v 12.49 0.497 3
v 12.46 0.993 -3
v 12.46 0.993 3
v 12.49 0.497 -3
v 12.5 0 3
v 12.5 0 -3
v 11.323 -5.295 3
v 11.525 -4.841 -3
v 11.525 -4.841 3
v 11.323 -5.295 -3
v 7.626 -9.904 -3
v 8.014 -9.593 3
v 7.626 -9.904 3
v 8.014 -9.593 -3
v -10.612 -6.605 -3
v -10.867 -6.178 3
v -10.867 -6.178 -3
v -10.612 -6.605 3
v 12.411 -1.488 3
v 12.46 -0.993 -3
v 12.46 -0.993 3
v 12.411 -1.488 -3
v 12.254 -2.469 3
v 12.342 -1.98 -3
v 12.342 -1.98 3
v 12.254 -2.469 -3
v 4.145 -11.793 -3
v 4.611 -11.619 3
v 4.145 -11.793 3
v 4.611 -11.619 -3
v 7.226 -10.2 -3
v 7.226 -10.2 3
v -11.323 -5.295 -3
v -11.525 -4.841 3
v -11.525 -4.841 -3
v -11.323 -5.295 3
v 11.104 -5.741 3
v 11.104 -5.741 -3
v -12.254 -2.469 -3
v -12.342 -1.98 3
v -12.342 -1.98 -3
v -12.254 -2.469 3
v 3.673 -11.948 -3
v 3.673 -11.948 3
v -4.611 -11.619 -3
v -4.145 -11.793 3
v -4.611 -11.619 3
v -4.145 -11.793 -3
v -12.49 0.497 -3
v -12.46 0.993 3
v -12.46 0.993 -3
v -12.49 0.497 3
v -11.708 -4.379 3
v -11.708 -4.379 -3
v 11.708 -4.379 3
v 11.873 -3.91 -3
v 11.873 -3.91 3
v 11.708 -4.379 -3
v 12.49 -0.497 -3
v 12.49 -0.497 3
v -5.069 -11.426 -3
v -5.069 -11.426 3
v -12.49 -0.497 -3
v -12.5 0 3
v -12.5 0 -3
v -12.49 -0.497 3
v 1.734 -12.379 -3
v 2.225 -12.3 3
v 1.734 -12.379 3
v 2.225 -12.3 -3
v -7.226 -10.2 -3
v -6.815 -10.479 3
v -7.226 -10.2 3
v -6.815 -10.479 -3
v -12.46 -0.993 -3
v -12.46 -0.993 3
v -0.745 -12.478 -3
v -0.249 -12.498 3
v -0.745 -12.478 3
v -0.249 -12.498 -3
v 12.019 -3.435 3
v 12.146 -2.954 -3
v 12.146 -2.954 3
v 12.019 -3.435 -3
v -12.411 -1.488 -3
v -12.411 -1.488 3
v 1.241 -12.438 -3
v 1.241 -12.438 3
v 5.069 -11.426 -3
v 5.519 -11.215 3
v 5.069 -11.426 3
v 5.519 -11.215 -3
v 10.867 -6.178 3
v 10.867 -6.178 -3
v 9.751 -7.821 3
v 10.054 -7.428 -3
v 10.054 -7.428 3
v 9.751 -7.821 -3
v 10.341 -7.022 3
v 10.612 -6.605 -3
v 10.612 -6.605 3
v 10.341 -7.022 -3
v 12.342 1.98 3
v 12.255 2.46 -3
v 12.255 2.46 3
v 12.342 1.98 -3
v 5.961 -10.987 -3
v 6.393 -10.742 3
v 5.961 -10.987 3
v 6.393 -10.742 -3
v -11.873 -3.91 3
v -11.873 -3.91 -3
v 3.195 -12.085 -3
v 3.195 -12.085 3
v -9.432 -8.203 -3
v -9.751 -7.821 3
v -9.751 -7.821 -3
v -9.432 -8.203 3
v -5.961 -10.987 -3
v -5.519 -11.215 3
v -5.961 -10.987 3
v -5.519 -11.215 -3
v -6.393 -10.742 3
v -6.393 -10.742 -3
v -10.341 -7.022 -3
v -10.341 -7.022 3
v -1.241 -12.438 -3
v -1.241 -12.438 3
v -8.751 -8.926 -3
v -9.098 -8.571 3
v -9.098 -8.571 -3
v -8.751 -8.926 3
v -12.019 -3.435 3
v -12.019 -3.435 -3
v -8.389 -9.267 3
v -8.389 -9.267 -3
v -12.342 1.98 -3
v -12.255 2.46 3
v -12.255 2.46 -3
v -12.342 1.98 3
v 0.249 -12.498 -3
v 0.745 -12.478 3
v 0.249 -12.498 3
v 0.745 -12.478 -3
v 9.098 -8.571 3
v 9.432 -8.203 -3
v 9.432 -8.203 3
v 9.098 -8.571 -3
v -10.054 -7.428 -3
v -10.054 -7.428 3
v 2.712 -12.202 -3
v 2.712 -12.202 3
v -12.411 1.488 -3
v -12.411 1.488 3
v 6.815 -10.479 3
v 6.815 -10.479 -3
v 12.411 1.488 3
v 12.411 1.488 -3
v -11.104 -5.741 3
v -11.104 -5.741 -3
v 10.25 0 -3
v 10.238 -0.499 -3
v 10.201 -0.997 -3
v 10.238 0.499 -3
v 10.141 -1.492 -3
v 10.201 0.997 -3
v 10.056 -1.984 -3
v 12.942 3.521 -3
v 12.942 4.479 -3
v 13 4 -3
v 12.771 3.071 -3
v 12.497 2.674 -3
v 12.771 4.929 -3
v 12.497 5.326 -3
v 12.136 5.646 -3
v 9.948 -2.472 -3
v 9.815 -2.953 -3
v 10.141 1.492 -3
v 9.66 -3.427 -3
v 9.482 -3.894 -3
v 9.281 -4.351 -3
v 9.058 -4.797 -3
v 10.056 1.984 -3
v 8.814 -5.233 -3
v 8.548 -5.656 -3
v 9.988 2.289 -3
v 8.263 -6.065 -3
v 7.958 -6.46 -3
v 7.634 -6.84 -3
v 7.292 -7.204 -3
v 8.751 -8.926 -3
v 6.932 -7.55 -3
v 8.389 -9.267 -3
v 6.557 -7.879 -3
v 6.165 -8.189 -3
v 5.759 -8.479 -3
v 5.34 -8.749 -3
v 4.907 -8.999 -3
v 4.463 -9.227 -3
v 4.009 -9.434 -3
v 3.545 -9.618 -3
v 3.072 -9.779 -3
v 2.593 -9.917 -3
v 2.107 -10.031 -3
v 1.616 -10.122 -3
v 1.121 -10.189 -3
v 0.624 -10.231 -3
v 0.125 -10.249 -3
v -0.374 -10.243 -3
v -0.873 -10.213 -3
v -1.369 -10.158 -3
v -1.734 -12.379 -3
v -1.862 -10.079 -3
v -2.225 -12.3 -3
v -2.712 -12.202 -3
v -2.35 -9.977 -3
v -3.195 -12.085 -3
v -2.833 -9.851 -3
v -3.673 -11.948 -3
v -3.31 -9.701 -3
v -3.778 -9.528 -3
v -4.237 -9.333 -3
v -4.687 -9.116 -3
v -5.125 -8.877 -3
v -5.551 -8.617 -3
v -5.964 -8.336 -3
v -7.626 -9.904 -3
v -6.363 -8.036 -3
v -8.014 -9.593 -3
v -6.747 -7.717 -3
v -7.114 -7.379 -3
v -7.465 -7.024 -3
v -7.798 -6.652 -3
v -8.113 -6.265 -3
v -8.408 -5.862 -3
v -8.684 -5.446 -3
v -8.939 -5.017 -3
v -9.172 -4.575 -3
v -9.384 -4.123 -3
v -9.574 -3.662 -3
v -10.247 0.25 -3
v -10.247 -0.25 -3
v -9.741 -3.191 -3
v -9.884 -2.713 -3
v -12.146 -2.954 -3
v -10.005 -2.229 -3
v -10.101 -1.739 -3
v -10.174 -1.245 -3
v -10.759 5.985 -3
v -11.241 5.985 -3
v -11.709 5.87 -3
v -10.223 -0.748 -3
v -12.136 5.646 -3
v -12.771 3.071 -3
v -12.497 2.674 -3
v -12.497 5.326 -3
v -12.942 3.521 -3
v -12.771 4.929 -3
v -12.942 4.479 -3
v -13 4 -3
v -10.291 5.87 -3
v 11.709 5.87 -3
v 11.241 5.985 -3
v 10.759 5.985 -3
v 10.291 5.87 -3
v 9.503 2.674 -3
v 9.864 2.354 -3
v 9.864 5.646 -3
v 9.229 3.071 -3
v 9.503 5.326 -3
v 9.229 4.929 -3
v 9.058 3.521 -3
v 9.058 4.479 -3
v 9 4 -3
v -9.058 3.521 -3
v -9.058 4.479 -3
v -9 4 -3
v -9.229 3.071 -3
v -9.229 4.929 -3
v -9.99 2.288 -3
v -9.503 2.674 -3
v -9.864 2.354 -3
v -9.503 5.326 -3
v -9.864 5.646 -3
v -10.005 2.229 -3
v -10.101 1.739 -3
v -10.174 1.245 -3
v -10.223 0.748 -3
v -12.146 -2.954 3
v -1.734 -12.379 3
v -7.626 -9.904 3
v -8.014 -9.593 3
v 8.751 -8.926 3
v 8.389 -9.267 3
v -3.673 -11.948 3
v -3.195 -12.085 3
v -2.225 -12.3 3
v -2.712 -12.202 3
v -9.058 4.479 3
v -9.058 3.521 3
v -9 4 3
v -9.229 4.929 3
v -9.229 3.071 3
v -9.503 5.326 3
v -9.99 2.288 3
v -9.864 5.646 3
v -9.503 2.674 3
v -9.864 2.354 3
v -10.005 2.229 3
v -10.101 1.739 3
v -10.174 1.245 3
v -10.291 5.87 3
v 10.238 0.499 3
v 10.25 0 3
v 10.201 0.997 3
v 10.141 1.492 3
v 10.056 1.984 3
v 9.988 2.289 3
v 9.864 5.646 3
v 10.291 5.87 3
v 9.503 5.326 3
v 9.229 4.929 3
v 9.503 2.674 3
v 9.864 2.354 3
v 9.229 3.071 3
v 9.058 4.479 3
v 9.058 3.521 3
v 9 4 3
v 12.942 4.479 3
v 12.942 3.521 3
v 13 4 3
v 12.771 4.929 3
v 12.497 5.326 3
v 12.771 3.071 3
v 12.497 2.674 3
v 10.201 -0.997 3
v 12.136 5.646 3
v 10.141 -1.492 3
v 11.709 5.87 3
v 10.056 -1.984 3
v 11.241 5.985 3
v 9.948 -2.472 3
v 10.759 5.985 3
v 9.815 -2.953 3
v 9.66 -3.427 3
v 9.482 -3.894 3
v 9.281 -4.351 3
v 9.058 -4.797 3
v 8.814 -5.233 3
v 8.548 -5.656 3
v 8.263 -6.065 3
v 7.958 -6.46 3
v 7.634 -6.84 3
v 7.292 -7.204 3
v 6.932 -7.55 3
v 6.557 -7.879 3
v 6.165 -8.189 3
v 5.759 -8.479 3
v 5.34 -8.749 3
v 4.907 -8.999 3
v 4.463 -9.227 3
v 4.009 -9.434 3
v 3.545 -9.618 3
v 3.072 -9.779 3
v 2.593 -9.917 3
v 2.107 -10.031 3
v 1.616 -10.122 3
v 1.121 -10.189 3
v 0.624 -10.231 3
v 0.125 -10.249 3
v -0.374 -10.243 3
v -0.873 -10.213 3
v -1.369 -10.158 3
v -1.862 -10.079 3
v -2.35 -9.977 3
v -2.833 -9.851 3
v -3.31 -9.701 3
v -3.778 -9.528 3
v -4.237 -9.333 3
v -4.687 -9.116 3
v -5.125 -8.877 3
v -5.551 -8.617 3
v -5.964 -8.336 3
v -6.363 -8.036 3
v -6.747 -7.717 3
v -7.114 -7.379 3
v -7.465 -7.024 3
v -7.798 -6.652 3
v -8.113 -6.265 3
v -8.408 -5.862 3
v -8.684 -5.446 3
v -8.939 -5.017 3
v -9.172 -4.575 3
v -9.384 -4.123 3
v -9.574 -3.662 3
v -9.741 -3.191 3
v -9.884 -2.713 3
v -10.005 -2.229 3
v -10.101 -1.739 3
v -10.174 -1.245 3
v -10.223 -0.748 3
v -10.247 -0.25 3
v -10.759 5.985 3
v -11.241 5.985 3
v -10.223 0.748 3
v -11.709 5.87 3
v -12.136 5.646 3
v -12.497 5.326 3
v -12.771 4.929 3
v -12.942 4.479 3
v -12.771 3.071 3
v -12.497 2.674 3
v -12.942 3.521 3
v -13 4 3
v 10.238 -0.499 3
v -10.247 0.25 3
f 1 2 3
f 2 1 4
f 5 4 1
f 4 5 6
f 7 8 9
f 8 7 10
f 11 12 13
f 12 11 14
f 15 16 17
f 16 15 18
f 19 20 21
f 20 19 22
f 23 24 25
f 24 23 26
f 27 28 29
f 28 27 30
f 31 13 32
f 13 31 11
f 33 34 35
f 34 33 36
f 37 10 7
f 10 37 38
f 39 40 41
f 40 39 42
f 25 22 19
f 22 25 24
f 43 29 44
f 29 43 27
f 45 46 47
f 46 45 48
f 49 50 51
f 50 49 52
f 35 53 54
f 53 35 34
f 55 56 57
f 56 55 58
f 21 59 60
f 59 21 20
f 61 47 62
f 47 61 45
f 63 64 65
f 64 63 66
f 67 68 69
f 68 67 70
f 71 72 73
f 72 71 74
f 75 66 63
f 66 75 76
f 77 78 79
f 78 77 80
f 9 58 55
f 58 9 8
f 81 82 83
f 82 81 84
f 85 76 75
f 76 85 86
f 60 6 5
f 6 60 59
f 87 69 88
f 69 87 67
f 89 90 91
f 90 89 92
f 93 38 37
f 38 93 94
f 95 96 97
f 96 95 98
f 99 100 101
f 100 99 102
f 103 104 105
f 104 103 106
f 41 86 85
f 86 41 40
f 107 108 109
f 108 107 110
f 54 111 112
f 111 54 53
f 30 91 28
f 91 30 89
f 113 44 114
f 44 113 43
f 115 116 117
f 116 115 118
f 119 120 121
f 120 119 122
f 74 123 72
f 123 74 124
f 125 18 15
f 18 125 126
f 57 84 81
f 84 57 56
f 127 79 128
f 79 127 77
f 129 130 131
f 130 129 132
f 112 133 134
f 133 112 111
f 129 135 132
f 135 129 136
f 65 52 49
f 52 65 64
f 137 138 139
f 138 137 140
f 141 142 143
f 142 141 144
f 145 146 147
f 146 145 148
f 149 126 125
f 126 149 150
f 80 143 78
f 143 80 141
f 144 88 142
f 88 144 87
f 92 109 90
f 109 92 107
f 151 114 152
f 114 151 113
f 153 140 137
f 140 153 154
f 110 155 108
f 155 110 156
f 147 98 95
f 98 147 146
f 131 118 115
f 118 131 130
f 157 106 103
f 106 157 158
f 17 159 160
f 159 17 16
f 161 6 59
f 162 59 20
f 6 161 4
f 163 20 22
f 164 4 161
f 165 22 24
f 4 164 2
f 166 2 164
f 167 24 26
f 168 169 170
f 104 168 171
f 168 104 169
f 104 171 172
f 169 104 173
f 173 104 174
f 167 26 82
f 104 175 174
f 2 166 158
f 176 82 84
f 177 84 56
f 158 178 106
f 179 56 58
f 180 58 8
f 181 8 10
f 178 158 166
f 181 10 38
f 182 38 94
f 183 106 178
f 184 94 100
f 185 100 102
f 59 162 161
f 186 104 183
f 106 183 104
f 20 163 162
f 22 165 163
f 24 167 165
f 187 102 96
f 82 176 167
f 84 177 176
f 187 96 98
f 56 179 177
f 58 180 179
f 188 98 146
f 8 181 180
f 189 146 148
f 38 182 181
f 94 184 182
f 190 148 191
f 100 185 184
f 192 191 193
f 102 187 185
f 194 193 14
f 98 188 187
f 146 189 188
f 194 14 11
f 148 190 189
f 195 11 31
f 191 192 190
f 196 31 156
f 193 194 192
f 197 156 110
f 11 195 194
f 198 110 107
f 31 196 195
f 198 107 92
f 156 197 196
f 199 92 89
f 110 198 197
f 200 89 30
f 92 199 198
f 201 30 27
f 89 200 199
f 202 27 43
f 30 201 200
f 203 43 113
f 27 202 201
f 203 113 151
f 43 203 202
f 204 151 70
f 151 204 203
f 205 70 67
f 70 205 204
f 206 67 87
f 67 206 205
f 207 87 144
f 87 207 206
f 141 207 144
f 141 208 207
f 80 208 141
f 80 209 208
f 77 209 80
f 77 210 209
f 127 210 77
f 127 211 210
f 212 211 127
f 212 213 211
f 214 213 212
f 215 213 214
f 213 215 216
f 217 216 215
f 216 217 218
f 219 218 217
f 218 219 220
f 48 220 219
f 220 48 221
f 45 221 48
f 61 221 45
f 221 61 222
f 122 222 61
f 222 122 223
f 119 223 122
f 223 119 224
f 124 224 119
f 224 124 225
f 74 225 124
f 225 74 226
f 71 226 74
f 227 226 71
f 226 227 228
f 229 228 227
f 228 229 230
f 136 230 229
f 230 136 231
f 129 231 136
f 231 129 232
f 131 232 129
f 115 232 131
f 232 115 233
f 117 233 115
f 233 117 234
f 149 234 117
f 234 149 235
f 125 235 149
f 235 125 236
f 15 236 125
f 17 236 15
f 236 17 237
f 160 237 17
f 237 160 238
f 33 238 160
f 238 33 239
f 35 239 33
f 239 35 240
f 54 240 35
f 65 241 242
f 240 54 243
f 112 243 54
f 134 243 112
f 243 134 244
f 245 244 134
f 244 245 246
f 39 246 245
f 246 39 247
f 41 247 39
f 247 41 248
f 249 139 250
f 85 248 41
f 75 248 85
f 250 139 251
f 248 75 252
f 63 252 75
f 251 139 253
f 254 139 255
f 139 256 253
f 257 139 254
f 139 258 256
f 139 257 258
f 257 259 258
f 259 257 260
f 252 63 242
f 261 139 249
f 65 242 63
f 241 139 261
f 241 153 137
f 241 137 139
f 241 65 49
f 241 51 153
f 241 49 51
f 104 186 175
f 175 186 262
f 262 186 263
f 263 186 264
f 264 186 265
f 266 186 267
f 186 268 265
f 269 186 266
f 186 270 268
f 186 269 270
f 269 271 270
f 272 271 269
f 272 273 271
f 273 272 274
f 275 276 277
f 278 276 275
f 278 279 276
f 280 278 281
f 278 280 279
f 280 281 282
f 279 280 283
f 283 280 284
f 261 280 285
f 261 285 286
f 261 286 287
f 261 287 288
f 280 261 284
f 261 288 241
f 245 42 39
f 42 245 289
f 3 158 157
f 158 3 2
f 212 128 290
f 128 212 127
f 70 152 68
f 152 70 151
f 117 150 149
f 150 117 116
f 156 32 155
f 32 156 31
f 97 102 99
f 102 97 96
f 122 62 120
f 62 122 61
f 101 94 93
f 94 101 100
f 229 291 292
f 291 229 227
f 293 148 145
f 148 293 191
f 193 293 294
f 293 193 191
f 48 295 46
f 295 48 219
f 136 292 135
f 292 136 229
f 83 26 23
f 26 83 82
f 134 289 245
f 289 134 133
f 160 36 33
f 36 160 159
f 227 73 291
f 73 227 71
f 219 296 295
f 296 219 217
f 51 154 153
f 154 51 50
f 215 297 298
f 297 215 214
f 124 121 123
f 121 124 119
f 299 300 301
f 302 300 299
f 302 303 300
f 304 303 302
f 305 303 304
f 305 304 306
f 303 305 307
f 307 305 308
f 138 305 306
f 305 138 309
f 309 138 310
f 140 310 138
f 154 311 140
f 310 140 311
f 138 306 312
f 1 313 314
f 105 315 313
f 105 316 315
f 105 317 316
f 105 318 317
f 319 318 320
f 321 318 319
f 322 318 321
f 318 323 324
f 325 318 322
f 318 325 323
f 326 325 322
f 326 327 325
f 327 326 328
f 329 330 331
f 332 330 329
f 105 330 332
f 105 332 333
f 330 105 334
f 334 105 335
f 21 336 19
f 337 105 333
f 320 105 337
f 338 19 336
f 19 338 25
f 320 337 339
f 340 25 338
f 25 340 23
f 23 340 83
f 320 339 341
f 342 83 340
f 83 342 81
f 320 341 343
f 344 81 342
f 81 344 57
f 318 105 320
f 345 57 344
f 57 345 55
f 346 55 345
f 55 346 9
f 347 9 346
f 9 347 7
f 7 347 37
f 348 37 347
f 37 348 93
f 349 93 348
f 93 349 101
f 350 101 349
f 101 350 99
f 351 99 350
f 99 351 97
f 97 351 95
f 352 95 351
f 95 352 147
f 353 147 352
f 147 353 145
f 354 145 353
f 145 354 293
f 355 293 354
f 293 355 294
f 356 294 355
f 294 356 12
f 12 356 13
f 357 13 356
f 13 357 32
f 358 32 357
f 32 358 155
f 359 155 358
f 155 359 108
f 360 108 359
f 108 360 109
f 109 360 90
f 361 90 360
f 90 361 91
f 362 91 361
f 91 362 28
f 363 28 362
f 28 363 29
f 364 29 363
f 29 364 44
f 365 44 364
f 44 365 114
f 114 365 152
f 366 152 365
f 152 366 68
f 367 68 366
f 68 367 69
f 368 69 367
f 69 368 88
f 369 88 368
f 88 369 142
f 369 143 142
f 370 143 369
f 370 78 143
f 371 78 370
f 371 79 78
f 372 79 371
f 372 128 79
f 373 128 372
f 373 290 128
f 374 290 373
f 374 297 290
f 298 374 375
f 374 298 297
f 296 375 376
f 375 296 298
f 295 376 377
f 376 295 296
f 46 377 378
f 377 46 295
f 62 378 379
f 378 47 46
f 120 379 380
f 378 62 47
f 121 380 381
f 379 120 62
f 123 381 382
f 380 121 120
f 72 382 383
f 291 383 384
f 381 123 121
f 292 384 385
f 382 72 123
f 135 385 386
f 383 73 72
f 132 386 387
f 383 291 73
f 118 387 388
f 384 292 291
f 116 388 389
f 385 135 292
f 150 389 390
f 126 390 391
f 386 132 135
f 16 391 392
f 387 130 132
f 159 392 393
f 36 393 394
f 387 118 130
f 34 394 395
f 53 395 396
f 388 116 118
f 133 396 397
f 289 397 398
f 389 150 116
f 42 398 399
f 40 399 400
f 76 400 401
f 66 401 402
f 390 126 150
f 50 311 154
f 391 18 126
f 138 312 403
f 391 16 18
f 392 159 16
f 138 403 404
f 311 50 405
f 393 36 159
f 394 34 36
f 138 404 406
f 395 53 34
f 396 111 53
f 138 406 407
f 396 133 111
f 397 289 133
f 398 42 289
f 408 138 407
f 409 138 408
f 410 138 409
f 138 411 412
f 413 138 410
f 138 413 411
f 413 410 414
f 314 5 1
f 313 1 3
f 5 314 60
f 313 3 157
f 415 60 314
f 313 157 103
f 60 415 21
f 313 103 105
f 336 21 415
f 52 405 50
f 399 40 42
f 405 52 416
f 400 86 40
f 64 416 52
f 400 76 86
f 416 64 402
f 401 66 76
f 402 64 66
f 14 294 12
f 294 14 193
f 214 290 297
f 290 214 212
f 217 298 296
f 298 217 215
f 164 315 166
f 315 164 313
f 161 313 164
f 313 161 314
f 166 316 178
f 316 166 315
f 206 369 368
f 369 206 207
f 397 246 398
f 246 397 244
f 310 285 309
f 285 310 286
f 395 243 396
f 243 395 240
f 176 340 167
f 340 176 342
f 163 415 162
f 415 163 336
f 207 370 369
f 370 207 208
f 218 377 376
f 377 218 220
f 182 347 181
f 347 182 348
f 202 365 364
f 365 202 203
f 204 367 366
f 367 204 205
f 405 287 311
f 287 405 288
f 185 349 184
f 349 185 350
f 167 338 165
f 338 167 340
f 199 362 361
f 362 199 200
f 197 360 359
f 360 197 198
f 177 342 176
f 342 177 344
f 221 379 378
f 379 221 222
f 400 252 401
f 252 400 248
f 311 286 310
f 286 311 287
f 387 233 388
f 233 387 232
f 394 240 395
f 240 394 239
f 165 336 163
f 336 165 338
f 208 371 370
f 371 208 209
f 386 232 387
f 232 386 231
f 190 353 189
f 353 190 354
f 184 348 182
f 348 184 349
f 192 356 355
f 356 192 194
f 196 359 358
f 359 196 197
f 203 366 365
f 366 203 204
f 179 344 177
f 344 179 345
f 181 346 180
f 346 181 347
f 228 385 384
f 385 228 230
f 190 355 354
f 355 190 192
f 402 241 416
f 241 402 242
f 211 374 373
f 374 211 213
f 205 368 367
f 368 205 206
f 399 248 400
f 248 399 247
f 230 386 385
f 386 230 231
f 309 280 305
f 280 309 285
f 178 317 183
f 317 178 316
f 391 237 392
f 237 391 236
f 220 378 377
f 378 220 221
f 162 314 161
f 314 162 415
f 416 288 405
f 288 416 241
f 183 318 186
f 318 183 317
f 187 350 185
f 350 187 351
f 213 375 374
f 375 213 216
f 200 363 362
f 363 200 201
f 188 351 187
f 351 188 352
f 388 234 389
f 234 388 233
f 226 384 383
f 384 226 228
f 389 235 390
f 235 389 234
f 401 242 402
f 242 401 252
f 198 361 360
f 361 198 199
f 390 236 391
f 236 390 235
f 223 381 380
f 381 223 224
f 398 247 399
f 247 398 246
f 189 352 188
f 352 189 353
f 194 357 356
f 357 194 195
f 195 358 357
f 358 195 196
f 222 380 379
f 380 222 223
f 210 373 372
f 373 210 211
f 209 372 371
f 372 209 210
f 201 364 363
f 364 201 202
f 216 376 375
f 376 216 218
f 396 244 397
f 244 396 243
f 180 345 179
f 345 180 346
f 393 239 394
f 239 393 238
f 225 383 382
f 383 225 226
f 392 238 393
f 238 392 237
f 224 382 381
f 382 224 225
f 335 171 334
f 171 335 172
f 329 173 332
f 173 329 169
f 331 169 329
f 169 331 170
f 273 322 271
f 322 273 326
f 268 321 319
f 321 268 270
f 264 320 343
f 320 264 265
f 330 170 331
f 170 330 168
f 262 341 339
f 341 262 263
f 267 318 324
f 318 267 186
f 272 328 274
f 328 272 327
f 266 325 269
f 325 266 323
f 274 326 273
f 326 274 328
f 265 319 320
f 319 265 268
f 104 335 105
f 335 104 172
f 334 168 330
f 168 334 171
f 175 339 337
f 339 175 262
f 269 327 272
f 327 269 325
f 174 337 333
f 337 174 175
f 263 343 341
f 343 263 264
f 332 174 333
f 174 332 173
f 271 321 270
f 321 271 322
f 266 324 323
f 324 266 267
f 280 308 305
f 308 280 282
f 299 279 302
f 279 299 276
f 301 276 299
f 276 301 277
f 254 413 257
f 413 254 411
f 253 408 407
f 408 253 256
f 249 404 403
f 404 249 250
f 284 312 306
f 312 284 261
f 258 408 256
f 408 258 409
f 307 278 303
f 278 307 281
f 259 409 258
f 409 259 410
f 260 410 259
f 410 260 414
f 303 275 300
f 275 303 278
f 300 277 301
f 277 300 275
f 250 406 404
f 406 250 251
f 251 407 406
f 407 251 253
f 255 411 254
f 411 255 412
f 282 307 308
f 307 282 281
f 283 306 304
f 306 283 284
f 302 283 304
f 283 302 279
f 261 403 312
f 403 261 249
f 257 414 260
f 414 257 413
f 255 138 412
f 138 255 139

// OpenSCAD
$fa=0.01;
$fs=0.5;

module clip() {
	difference() {
		cylinder(r=12.5, h=6, center=true);
		cylinder(r=10.25, h=15, center=true);
		translate([0,11,0])
		cube([27,13,7],center=true);	
	}
}

//translate([-60,0,0])
clip();

for(x=[11,-11]) {
	translate([x,4,0])
	cylinder(r=2,h=6,center=true);
}
